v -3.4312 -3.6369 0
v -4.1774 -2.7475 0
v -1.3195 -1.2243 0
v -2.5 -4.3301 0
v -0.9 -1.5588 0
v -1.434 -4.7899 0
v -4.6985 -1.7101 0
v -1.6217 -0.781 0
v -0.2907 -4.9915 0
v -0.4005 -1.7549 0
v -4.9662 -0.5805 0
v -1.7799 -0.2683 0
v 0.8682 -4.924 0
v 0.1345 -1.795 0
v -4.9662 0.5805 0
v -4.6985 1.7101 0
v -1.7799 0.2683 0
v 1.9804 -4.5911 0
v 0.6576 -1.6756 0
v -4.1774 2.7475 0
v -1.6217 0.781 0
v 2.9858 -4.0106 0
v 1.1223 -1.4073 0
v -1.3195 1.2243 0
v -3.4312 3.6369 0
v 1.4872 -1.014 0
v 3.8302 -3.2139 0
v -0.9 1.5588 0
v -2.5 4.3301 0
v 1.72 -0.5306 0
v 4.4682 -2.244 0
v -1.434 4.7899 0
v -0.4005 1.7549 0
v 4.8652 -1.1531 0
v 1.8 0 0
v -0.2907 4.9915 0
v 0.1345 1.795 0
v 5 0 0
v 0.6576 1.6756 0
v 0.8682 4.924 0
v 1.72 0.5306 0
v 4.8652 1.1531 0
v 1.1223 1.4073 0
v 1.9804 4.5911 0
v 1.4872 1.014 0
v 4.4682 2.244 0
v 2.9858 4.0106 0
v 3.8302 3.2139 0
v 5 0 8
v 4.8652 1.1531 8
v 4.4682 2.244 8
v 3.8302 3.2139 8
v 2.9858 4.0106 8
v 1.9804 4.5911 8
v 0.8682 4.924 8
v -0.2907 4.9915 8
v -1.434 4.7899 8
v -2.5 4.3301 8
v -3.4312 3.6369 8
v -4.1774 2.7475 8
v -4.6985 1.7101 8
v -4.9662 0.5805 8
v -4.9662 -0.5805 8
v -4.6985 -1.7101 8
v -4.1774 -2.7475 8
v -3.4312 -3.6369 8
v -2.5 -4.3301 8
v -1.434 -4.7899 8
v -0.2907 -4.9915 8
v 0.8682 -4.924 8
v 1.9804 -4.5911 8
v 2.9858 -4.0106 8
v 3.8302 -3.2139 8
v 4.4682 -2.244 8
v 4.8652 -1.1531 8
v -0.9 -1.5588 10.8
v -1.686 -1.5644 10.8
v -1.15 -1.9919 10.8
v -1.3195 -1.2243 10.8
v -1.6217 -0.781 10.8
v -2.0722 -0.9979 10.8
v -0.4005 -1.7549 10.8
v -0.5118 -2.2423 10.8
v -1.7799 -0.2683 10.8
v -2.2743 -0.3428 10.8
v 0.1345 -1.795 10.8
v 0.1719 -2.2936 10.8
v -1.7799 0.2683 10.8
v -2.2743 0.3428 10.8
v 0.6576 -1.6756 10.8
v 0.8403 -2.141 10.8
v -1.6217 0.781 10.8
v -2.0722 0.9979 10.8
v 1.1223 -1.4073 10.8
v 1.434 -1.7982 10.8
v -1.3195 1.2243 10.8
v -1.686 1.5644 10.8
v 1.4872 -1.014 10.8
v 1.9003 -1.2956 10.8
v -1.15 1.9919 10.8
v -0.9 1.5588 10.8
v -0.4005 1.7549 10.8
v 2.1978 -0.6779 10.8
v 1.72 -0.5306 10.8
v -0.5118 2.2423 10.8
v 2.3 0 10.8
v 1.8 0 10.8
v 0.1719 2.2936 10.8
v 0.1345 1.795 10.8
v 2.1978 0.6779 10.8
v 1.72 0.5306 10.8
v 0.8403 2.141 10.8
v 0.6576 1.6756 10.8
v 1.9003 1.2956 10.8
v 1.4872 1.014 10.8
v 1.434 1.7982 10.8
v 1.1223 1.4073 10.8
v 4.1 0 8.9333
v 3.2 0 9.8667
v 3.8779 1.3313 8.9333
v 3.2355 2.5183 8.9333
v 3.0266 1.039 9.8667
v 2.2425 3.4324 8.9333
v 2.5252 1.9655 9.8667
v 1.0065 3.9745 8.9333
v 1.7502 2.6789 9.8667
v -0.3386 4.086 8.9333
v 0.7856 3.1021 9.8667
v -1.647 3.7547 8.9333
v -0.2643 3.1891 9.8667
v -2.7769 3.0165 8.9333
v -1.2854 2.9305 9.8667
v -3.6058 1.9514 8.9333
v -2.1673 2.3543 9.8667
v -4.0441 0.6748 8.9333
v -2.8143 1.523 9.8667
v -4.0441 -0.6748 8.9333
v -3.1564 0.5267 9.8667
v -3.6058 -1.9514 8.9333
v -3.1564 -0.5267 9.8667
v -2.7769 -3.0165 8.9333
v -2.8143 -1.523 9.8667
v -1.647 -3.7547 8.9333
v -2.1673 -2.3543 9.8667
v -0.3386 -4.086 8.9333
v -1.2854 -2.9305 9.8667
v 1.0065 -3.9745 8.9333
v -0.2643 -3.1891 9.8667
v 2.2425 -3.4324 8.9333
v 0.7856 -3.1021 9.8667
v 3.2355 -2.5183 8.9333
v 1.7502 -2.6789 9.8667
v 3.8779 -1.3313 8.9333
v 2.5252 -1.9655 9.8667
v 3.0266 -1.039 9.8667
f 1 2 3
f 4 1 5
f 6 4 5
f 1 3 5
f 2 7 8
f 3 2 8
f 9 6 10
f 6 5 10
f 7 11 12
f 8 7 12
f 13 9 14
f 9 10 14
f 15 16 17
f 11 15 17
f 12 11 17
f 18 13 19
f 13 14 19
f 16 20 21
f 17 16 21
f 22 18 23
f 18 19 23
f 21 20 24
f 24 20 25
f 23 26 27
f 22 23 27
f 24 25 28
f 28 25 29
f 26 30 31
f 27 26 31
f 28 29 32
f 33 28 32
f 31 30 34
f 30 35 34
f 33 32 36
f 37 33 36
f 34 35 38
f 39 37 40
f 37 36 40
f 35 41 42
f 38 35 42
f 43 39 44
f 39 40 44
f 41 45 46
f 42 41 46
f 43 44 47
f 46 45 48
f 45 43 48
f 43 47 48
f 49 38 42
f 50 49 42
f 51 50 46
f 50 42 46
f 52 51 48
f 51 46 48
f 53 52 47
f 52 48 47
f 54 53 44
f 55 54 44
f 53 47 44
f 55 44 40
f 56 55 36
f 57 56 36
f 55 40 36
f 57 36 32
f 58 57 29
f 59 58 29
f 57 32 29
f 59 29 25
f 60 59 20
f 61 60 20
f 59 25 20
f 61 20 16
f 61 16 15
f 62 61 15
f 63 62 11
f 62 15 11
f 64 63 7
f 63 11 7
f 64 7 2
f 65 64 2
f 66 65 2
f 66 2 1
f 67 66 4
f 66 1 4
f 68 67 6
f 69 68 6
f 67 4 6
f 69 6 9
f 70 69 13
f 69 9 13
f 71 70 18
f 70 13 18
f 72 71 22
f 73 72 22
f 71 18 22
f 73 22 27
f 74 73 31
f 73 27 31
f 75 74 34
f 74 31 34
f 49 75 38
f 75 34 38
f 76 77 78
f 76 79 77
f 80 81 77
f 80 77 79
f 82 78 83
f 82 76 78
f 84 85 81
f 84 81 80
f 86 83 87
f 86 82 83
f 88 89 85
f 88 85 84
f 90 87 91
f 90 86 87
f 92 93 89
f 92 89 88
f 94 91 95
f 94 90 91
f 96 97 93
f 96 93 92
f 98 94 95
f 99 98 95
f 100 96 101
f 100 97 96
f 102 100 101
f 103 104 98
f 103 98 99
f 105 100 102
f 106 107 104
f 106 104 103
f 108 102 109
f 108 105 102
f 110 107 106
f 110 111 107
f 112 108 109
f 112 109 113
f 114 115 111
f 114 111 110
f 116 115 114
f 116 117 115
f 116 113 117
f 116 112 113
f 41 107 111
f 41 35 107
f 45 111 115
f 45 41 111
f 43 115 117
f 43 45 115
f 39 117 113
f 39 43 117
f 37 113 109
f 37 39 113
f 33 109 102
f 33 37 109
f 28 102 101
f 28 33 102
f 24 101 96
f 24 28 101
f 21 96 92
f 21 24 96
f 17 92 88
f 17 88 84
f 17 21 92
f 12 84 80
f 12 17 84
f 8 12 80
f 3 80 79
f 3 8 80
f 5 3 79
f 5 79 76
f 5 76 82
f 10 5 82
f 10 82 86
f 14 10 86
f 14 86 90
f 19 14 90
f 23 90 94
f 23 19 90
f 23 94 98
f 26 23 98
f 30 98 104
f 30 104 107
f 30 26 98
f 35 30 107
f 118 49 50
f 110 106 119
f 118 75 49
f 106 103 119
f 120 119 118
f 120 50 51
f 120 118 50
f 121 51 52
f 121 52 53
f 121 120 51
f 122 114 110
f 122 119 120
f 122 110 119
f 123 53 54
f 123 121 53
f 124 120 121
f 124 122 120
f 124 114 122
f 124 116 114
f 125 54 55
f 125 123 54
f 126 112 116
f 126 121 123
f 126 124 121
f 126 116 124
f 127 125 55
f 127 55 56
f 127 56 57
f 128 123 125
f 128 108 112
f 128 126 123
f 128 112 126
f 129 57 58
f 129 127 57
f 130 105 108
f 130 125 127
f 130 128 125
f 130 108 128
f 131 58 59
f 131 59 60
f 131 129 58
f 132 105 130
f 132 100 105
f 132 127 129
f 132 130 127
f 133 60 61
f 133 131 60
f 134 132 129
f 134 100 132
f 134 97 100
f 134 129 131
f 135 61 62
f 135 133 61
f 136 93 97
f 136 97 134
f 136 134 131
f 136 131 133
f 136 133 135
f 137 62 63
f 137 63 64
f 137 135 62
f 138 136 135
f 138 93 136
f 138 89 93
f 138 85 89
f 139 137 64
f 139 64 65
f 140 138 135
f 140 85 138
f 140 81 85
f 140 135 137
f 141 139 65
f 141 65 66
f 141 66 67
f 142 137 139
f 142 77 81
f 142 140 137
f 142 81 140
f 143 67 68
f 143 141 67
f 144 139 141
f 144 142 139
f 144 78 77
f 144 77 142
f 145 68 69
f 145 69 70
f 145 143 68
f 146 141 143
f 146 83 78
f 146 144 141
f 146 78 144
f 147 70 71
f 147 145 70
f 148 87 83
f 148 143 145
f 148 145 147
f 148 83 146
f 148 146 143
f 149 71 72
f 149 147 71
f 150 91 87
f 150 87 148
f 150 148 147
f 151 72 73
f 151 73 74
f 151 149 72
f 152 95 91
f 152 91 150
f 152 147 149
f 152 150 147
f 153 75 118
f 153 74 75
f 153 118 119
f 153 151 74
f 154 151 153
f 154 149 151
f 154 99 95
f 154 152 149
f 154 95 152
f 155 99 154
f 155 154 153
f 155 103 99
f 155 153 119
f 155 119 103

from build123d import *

# Parameters (mm, degrees)
CYLINDER100_R     = 1.8
CYLINDER100_DEPTH = 2.8
TUBE_R            = 5
TUBE_R_2          = 1.8
TUBE_DEPTH        = 8


with BuildPart() as puller_washer_cone_hole:
    # Cylinder100 → Cylinder100 (new body)
    with BuildSketch(Plane.XY):
        Circle(CYLINDER100_R)
    extrude(amount=CYLINDER100_DEPTH)


with BuildPart() as puller_washer_cone_cut:
    # Cone → Cone (revolve)
    with BuildSketch(Plane.XZ):
        Polygon((0, 0), (5, 0), (2.3, 2.8), (0, 2.8), align=None)
    revolve(axis=Axis((0, 0, 0), (0, 0, 1)))

    # Cut: cut puller washer cone hole
    add(puller_washer_cone_hole.part, mode=Mode.SUBTRACT)


with BuildPart() as puller_washer_cone_cut_1:
    # Cut placement: moved
    add(puller_washer_cone_cut.part.moved(Location((0, 0, 8))))


with BuildPart() as puller_mount_washer:
    # Tube → Tube (new body)
    with BuildSketch(Plane.XY):
        Circle(TUBE_R)
        Circle(TUBE_R_2, mode=Mode.SUBTRACT)
    extrude(amount=TUBE_DEPTH)

    # Fusion: union puller washer cone cut
    add(puller_washer_cone_cut_1.part)


solid = puller_mount_washer.part
